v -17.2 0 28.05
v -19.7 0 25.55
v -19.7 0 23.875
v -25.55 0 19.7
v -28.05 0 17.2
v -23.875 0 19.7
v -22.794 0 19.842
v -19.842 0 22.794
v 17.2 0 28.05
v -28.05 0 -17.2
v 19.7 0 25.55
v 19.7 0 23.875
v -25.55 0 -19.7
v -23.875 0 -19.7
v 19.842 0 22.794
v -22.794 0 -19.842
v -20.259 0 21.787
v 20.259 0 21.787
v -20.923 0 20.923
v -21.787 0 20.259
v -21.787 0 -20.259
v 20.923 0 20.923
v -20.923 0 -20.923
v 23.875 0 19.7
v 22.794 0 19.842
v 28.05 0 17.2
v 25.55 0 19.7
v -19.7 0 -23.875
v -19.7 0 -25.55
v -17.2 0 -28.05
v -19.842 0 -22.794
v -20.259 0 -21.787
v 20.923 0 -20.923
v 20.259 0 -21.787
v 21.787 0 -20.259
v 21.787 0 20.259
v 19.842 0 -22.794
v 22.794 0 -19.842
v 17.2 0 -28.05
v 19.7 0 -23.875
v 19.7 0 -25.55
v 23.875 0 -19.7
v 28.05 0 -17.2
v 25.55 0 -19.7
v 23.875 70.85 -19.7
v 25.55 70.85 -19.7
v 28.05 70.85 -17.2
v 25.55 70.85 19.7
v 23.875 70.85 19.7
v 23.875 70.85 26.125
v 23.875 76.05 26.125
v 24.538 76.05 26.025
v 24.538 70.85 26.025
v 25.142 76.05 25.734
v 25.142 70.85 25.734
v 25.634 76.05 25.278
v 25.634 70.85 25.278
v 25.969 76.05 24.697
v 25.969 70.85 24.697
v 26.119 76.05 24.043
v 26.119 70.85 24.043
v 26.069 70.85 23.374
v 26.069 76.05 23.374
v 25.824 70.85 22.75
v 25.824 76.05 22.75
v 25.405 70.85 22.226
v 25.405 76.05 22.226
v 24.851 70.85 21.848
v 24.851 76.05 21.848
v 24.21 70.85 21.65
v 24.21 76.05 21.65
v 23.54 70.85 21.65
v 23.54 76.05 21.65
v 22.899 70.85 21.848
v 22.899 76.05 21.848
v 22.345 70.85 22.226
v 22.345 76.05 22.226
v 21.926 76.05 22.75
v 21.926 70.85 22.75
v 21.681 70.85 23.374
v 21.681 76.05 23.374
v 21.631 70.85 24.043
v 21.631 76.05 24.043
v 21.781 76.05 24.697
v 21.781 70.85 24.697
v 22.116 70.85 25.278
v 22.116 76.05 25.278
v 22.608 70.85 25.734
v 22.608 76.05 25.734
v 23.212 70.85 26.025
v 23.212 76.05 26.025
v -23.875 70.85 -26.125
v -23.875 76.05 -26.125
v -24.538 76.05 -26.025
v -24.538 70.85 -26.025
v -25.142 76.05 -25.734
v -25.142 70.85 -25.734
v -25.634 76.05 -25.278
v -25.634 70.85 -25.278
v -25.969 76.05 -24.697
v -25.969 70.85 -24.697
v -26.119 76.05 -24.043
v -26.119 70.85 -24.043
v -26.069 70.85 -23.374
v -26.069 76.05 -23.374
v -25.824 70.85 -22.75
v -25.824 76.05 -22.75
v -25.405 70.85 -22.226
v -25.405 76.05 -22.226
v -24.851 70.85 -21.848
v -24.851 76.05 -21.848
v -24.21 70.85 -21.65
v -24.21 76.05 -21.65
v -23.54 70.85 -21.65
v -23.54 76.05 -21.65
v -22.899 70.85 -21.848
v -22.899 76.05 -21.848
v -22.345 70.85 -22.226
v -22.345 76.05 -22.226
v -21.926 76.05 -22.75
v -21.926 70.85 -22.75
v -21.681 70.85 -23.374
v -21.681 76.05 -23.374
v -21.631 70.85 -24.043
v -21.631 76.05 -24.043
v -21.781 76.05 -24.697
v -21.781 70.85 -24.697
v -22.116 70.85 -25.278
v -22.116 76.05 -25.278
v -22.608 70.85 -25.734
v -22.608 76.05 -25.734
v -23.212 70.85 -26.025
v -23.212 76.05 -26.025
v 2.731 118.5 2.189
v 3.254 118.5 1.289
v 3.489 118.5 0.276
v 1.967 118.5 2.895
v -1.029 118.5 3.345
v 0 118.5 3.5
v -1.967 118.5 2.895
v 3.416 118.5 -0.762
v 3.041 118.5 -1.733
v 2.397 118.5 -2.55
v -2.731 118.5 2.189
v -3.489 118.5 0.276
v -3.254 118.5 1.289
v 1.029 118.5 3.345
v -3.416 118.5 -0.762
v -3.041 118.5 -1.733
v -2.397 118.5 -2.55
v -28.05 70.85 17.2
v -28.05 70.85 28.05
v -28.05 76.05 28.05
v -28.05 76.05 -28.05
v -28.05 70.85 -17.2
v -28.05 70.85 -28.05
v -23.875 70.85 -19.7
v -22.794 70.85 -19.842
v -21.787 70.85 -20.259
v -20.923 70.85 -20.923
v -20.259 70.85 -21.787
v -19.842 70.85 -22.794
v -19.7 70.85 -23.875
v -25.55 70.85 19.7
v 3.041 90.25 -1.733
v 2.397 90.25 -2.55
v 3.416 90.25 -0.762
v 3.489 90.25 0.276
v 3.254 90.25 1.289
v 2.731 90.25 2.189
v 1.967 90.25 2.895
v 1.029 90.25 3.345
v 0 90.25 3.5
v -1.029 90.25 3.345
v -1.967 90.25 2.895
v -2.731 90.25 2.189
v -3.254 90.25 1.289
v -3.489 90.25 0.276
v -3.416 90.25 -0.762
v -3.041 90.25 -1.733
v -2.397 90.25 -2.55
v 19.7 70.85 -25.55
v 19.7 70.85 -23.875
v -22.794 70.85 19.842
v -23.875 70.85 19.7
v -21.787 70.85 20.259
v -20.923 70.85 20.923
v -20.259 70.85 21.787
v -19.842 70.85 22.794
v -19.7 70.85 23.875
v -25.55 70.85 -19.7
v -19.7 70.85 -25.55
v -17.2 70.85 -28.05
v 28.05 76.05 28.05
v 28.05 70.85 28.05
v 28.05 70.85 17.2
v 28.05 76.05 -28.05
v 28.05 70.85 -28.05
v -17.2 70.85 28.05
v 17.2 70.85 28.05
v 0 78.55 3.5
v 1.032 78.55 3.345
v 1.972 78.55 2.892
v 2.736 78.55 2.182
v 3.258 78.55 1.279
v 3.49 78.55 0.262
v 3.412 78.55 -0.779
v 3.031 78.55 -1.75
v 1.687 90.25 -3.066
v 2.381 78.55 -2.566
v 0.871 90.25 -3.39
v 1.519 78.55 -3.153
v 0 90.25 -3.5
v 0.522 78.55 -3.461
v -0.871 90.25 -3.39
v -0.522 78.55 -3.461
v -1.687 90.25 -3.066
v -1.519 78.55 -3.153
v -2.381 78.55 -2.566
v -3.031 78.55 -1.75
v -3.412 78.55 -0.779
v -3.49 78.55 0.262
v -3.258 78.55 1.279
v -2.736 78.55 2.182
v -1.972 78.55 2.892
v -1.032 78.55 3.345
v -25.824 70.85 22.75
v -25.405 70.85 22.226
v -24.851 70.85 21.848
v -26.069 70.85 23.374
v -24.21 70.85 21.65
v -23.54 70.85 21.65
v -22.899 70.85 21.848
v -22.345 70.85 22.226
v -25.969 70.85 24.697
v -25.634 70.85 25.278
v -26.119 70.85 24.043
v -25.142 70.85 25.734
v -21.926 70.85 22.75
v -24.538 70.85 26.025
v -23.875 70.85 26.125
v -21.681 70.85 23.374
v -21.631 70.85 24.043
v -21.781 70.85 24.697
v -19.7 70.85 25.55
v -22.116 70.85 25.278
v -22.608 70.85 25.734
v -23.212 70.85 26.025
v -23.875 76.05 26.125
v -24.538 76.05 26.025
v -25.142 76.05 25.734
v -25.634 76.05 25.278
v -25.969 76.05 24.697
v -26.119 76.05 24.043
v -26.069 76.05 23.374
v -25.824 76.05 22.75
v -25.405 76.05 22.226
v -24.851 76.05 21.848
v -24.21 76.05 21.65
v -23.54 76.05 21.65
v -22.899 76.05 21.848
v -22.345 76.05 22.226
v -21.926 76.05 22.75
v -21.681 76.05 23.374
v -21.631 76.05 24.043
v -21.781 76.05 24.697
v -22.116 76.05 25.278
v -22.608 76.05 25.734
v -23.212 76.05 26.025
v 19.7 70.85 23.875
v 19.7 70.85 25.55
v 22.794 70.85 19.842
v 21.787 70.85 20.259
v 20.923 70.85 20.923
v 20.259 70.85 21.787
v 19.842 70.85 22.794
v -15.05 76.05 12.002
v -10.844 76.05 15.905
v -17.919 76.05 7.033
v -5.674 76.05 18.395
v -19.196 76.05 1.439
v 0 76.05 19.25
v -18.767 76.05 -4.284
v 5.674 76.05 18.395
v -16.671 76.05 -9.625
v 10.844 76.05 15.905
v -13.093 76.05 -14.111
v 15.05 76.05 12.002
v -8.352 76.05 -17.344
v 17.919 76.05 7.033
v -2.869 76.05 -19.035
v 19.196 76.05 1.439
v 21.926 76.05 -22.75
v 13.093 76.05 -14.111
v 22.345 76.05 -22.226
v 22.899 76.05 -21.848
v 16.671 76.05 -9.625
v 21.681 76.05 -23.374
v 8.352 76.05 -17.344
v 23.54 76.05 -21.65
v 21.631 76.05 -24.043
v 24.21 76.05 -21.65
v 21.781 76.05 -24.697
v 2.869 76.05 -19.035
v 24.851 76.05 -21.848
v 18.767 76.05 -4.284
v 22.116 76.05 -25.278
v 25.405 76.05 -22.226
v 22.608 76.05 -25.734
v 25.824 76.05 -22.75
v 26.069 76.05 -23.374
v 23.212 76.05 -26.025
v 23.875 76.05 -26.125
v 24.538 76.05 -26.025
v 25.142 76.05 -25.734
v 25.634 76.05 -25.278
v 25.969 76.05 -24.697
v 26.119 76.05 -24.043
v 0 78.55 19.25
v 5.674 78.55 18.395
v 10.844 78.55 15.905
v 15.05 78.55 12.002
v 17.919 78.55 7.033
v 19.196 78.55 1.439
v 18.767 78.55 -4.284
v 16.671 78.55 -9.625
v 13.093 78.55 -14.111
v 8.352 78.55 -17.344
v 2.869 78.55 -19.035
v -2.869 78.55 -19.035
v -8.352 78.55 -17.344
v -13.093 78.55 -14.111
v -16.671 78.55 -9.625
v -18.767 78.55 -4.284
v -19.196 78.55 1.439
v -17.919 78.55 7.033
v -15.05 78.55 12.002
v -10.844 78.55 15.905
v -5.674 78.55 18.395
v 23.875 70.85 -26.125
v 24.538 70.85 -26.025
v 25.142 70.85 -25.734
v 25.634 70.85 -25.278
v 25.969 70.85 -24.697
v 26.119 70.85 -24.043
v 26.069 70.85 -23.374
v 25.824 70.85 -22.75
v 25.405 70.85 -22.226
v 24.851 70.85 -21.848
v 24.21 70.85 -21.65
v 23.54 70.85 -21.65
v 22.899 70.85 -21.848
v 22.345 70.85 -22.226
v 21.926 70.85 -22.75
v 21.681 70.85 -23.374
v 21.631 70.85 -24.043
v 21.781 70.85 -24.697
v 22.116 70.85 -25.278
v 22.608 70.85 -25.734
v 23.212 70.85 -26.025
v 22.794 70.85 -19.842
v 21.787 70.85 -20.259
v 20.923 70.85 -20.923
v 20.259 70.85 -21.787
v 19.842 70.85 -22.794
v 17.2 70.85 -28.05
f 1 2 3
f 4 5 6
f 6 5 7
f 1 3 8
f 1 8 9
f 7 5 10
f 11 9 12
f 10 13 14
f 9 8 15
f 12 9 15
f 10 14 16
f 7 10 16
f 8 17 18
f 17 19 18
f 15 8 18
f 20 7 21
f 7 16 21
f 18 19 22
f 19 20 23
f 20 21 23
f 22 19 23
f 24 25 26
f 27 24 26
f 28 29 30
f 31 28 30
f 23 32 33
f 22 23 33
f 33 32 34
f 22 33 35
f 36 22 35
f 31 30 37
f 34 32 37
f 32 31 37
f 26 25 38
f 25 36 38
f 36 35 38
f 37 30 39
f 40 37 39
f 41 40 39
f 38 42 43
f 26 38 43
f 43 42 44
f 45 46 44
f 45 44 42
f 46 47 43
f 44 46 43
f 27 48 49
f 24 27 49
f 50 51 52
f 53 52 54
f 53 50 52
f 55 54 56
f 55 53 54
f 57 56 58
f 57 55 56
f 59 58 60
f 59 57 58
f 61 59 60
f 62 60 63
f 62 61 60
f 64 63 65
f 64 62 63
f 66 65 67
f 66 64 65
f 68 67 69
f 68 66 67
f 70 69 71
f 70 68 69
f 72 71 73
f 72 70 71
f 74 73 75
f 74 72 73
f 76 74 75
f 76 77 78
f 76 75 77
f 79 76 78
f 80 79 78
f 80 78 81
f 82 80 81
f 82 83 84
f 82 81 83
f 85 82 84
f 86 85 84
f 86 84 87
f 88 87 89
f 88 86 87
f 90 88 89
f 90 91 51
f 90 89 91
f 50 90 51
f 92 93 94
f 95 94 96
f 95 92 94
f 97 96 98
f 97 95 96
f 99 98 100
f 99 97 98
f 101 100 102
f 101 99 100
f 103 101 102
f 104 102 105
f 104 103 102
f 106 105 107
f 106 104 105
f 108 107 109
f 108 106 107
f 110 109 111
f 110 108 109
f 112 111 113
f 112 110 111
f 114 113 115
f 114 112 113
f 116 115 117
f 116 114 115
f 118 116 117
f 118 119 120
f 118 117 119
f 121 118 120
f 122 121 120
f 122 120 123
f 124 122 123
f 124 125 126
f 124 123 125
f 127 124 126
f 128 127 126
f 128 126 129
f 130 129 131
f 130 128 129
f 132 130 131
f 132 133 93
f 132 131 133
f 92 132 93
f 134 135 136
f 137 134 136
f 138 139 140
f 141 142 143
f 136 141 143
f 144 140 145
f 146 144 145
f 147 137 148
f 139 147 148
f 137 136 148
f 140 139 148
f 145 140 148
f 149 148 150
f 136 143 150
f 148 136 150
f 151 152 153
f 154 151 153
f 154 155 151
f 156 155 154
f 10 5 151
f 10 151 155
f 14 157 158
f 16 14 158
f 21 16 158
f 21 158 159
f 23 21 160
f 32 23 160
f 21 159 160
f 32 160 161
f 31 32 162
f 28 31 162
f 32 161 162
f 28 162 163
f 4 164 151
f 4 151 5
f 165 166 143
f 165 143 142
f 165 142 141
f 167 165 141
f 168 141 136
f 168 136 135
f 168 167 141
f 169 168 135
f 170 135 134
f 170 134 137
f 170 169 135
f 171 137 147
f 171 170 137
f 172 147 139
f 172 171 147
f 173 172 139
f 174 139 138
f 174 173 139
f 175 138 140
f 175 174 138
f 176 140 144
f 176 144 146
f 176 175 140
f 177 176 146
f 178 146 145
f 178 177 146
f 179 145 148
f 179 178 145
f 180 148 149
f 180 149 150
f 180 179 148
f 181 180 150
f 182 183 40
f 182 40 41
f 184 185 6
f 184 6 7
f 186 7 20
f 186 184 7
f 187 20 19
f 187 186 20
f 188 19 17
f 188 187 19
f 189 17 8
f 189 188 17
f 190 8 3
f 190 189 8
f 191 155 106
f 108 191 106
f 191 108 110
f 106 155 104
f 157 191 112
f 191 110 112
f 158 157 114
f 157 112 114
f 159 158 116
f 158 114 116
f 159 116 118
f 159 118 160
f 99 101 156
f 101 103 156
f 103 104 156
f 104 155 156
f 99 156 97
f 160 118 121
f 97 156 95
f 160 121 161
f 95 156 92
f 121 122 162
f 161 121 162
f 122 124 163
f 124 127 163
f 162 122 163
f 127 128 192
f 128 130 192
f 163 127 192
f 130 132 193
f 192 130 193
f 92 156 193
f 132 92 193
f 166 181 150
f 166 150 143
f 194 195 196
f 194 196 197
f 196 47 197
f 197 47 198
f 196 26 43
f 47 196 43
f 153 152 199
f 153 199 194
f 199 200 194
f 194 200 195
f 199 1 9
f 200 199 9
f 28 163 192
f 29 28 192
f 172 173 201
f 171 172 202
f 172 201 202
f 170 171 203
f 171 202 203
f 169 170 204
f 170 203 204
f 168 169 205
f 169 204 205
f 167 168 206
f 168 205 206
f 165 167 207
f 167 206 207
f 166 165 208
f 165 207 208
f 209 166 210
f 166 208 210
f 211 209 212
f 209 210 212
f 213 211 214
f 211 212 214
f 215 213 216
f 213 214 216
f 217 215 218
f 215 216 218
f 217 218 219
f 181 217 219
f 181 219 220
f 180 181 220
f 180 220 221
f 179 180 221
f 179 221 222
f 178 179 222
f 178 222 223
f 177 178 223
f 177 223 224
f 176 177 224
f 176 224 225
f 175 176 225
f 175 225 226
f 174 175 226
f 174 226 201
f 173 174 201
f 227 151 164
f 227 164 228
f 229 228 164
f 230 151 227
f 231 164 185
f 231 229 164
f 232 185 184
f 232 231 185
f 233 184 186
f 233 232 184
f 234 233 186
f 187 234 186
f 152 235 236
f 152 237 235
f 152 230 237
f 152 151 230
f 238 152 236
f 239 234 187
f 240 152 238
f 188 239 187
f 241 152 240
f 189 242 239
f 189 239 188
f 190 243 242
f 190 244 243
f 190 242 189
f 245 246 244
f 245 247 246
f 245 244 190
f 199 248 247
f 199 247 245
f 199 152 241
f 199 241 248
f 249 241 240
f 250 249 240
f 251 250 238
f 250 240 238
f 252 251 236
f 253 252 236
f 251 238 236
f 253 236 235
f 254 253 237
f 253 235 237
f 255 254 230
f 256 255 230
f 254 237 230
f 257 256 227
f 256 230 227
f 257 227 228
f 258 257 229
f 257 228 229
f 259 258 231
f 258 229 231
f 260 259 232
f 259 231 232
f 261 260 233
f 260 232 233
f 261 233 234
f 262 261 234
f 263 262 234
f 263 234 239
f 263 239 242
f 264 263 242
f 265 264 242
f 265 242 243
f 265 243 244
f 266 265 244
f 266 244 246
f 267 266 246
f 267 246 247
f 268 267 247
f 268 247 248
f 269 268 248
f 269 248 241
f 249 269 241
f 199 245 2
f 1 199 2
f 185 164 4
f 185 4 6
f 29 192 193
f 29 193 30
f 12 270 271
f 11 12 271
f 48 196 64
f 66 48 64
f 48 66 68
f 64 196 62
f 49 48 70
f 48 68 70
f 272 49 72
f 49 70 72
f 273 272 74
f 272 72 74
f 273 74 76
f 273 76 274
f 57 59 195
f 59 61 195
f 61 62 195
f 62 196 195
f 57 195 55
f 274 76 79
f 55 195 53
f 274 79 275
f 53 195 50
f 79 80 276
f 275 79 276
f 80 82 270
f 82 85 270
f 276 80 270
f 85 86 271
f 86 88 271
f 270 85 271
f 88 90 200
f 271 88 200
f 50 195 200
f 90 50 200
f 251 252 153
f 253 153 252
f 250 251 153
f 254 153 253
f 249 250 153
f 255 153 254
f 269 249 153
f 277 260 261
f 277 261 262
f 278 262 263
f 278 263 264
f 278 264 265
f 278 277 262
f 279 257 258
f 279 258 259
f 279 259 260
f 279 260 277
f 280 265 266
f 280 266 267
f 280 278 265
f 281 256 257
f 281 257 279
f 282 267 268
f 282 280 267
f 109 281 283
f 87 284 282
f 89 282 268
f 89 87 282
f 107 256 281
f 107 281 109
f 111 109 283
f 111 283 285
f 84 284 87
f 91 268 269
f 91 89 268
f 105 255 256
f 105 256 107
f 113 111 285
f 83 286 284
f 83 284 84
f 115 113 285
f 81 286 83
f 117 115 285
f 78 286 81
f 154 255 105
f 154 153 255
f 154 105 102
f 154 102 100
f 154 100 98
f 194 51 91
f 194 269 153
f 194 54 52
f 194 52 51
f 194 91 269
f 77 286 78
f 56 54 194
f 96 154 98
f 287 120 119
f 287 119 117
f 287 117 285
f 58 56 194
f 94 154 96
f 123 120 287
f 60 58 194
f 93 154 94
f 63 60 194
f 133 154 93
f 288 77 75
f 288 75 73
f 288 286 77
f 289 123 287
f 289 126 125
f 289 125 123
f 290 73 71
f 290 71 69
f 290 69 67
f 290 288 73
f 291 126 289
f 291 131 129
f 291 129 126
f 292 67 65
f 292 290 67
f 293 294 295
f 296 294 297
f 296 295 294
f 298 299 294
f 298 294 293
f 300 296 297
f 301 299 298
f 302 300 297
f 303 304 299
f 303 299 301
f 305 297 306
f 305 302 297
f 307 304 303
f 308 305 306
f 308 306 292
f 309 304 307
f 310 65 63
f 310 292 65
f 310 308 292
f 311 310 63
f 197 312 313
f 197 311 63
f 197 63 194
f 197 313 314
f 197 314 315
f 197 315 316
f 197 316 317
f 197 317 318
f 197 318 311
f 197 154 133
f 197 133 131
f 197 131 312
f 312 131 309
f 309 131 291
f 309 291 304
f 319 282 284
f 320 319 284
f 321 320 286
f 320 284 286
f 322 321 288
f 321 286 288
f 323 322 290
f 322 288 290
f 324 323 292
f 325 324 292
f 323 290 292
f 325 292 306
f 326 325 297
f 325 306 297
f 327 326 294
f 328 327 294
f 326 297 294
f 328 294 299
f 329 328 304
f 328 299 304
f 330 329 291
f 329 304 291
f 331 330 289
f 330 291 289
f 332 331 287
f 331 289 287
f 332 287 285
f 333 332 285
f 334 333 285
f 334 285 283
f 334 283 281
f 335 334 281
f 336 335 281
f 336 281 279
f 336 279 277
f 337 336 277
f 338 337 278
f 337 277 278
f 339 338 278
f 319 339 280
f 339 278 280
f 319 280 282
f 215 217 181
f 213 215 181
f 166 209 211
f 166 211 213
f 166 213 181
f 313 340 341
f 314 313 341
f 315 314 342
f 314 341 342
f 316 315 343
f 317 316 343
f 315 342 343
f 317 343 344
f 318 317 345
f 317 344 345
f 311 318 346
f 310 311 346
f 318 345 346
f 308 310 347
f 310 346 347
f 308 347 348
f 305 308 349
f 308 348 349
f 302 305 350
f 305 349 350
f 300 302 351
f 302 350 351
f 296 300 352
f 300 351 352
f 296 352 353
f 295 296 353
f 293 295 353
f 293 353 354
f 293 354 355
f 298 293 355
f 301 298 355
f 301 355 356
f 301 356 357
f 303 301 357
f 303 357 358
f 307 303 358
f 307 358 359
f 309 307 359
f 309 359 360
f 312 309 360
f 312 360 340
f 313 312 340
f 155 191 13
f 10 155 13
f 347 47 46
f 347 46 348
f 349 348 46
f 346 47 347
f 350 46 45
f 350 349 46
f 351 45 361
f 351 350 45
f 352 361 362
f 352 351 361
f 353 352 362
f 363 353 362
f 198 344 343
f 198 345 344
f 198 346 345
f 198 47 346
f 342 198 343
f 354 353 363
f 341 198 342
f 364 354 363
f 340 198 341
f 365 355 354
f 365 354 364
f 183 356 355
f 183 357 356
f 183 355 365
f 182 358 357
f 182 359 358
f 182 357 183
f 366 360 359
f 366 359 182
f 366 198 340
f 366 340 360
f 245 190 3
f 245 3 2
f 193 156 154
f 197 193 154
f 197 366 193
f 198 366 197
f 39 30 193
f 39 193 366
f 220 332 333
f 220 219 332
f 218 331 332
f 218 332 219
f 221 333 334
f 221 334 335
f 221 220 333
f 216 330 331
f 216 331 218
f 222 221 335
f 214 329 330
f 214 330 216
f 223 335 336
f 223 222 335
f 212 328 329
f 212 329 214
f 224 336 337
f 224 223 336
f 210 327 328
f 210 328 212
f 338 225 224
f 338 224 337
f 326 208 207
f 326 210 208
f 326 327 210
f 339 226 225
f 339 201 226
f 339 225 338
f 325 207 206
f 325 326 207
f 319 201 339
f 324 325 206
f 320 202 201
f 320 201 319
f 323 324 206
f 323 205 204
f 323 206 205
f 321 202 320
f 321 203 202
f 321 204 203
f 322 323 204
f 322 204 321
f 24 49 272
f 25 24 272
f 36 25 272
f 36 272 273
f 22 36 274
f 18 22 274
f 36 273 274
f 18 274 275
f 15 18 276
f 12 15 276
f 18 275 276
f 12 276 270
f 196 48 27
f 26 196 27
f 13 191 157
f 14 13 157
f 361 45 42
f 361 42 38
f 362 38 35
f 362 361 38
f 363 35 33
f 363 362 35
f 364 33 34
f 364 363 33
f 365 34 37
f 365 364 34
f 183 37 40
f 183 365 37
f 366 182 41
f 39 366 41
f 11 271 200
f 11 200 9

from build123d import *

# Parameters (mm, degrees)
CROQUIS1_W                                 = 56.1
CROQUIS1_H                                 = 56.1
SALIENTE_EXTRUIR1_DEPTH                    = 76.05
CORTAR_EXTRUIR1_DEPTH                      = 82.199307
SIMETR_A3_AT_THE_SECOND_PLANE_COPY_1_DEPTH = 82.199307
CHAFL_N1_SIZE                              = 2.5
CROQUIS3_R                                 = 2.25
CORTAR_EXTRUIR2_DEPTH                      = 82.199307
SIMETR_A4_AT_THE_SECOND_PLANE_COPY_1_SKE_R = 2.25
SIMETR_A4_AT_THE_SECOND_PLANE_COPY_1_DEPTH = 82.199307
CROQUIS4_R                                 = 19.25
SALIENTE_EXTRUIR2_DEPTH                    = 2.5
CROQUIS6_R                                 = 3.5
SALIENTE_EXTRUIR4_DEPTH                    = 11.7
SALIENTE_EXTRUIR5_DEPTH                    = 28.15
SALIENTE_EXTRUIR3_DEPTH                    = 39.95


with BuildPart() as part:
    # Croquis1 → Saliente-Extruir1 (new body)
    with BuildSketch(Plane(origin=(0, 0, 0), x_dir=(1, 0, 0), z_dir=(0, 1, 0))):
        Rectangle(CROQUIS1_W, CROQUIS1_H)
    extrude(amount=SALIENTE_EXTRUIR1_DEPTH)

    # Croquis2 → Cortar-Extruir1 (cut, through all)
    with BuildSketch(Plane(origin=(0, 70.85, 0), x_dir=(1, 0, 0), z_dir=(0, 1, 0))):
        with BuildLine():
            Line((-28.05, 19.7), (-23.875, 19.7))
            ThreePointArc((-23.875, 19.7), (-20.922829, 20.922829), (-19.7, 23.875))
            Line((-19.7, 23.875), (-19.7, 28.05))
            Line((-19.7, 28.05), (-28.05, 28.05))
            Line((-28.05, 28.05), (-28.05, 19.7))
        make_face()
    cortar_extruir1 = extrude(amount=-CORTAR_EXTRUIR1_DEPTH, mode=Mode.SUBTRACT)

    # Simetría3: Cortar-Extruir1 across plane
    add(cortar_extruir1.mirror(Plane(origin=(0, 0, 0), x_dir=(0, 0, 1), z_dir=(1, 0, 0))), mode=Mode.SUBTRACT)

    # Simetría3 at the second plane: Cortar-Extruir1 across plane
    add(cortar_extruir1.mirror(Plane.XY), mode=Mode.SUBTRACT)

    # Simetría3 at the second plane copy 1 ske → Simetría3 at the second plane copy 1 (cut, through all)
    with BuildSketch(Plane(origin=(0, 70.85, 0), x_dir=(-1, 0, 0), z_dir=(0, 1, 0))):
        with BuildLine():
            Line((-28.05, 19.7), (-23.875, 19.7))
            ThreePointArc((-23.875, 19.7), (-20.922829, 20.922829), (-19.7, 23.875))
            Line((-19.7, 23.875), (-19.7, 28.05))
            Line((-19.7, 28.05), (-28.05, 28.05))
            Line((-28.05, 28.05), (-28.05, 19.7))
        make_face()
    extrude(amount=-SIMETR_A3_AT_THE_SECOND_PLANE_COPY_1_DEPTH, mode=Mode.SUBTRACT)

    # Chaflán1
    chafl_n1_edges = [part.edges().sort_by_distance(p)[0] for p in [
        (-28.05, 35.425, -19.7),
        (-19.7, 35.425, -28.05),
        (-28.05, 35.425, 19.7),
        (-19.7, 35.425, 28.05),
        (28.05, 35.425, -19.7),
        (19.7, 35.425, -28.05),
        (28.05, 35.425, 19.7),
        (19.7, 35.425, 28.05),
    ]]
    chamfer(chafl_n1_edges, length=CHAFL_N1_SIZE)

    # Croquis3 → Cortar-Extruir2 (cut, through all)
    with BuildSketch(Plane.XZ.offset(-70.85)):
        with Locations(Location((23.875, -23.875, 0), (0, 0, 270))):
            Circle(CROQUIS3_R)
    cortar_extruir2 = extrude(amount=-CORTAR_EXTRUIR2_DEPTH, mode=Mode.SUBTRACT)

    # Simetría4: Cortar-Extruir2 across plane
    add(cortar_extruir2.mirror(Plane(origin=(0, 0, 0), x_dir=(0, 0, 1), z_dir=(1, 0, 0))), mode=Mode.SUBTRACT)

    # Simetría4 at the second plane: Cortar-Extruir2 across plane
    add(cortar_extruir2.mirror(Plane.XY), mode=Mode.SUBTRACT)

    # Simetría4 at the second plane copy 1 ske → Simetría4 at the second plane copy 1 (cut, through all)
    with BuildSketch(Plane(origin=(0, 70.85, 0), x_dir=(-1, 0, 0), z_dir=(0, -1, 0))):
        with Locations(Location((23.875, -23.875, 0), (0, 0, 270))):
            Circle(SIMETR_A4_AT_THE_SECOND_PLANE_COPY_1_SKE_R)
    extrude(amount=-SIMETR_A4_AT_THE_SECOND_PLANE_COPY_1_DEPTH, mode=Mode.SUBTRACT)

    # Croquis4 → Saliente-Extruir2 (add)
    with BuildSketch(Plane(origin=(0, 76.05, 0), x_dir=(1, 0, 0), z_dir=(0, 1, 0))):
        with Locations(Location((0, 0, 0), (0, 0, 270))):
            Circle(CROQUIS4_R)
    extrude(amount=SALIENTE_EXTRUIR2_DEPTH)

    # Croquis6 → Saliente-Extruir4 (add)
    with BuildSketch(Plane(origin=(0, 78.55, 0), x_dir=(1, 0, 0), z_dir=(0, 1, 0))):
        with Locations(Location((0, 0, 0), (0, 0, 270))):
            Circle(CROQUIS6_R)
    extrude(amount=SALIENTE_EXTRUIR4_DEPTH)

    # Croquis7 → Saliente-Extruir5 (add)
    with BuildSketch(Plane(origin=(0, 90.25, 0), x_dir=(1, 0, 0), z_dir=(0, 1, 0))):
        with BuildLine():
            Line((-2.397394, 2.55), (2.397394, 2.55))
            ThreePointArc((2.397394, 2.55), (0, -3.5), (-2.397394, 2.55))
        make_face()
    extrude(amount=SALIENTE_EXTRUIR5_DEPTH)

    # Croquis5 → Saliente-Extruir3 (add)
    with BuildSketch(Plane(origin=(0, 78.55, 0), x_dir=(1, 0, 0), z_dir=(0, 1, 0))):
        with BuildLine():
            Line((-2.397394, 2.55), (2.397394, 2.55))
            ThreePointArc((2.397394, 2.55), (0, -3.5), (-2.397394, 2.55))
        make_face()
    extrude(amount=SALIENTE_EXTRUIR3_DEPTH)


solid = part.part
